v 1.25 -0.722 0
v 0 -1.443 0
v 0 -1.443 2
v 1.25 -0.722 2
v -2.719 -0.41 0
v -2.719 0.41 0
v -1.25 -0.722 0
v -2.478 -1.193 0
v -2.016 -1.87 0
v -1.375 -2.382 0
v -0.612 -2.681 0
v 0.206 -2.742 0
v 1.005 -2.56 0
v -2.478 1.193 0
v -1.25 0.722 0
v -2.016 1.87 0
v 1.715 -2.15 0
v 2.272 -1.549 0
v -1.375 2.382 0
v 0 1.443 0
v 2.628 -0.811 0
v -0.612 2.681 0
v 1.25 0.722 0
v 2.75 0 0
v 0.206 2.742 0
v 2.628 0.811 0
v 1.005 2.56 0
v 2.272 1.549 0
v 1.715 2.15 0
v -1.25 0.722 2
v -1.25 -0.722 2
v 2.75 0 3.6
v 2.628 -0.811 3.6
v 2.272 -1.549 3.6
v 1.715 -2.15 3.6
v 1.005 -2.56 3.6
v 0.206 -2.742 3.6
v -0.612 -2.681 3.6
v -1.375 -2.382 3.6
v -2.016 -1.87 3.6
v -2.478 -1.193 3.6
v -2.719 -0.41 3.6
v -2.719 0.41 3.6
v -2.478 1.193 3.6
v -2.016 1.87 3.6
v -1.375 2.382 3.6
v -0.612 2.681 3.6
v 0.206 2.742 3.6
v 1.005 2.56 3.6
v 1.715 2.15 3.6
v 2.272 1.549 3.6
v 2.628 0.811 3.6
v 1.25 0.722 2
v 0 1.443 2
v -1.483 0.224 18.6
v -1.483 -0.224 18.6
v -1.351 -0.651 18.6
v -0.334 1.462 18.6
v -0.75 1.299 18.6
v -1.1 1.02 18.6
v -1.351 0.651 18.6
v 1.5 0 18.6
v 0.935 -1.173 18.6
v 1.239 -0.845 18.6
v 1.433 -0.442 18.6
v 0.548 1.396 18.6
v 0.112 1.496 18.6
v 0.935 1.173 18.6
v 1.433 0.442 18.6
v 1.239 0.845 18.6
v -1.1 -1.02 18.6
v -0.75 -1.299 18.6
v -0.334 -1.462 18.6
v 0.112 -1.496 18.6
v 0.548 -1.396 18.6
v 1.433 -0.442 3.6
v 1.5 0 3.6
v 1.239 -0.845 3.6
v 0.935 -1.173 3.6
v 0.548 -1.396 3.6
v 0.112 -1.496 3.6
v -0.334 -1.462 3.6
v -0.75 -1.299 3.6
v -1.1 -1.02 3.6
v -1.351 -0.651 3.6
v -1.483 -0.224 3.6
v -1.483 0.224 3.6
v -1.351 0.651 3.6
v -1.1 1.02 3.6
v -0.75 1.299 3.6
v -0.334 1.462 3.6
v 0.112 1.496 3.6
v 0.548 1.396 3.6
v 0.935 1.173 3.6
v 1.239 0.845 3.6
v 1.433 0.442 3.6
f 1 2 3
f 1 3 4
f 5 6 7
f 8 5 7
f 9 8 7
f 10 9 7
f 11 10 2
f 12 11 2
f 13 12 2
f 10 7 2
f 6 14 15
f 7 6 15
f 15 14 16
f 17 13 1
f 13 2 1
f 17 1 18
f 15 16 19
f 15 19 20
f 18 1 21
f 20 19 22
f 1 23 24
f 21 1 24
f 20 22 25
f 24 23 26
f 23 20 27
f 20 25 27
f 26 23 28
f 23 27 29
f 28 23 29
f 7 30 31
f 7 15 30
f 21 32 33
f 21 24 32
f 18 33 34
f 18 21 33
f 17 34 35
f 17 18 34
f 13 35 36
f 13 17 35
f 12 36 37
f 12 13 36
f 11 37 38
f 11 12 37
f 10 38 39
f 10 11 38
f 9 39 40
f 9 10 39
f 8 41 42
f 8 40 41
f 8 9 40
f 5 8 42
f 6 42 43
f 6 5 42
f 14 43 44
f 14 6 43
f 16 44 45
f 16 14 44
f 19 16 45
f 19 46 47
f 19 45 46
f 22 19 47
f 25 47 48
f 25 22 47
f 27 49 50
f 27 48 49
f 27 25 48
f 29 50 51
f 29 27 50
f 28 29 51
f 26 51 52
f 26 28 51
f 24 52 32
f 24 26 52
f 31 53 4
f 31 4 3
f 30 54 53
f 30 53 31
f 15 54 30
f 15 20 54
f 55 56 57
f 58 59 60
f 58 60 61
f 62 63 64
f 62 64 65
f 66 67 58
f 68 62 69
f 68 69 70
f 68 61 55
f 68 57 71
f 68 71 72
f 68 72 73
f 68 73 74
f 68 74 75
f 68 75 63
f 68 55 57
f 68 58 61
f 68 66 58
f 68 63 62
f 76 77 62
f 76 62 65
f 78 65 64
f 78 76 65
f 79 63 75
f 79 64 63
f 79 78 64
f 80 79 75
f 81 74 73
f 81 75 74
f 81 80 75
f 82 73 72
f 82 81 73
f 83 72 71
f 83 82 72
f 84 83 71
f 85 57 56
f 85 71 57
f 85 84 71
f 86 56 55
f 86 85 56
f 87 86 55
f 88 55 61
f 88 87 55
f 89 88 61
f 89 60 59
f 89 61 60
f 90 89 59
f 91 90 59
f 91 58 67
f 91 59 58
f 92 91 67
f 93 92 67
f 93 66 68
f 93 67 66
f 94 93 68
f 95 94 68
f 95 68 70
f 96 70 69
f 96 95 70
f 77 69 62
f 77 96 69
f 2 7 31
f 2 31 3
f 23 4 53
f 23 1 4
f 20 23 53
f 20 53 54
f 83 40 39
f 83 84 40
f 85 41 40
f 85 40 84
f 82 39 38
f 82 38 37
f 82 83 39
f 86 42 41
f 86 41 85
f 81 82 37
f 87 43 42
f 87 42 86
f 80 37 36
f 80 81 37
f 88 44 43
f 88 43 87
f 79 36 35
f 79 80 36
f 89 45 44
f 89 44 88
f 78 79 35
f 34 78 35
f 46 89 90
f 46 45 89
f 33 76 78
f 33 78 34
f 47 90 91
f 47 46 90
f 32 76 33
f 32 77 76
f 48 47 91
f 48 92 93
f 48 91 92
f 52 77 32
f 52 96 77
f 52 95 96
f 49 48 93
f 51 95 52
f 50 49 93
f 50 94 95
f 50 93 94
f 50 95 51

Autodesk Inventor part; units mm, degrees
ref_plane "YZ Plane" through (0, 0, 0) normal (1, 0, 0) x (0, 1, 0)
ref_plane "XZ Plane" through (0, 0, 0) normal (0, 1, 0) x (-1, 0, 0)
ref_plane "XY Plane" through (0, 0, 0) normal (0, 0, 1) x (1, 0, 0)
sketch "スケッチ1" plane through (0, 0, 0) normal (0, 0, 1) x (1, 0, 0)
  circle A0 centre (0, 0) radius 2.75
  dimension "d0" = 5.5
extrude "押し出し1" add sketch "スケッチ1" along normal blind 3.6
sketch "スケッチ2" plane through (0, 0, 3.6) normal (0, 0, 1) x (1, 0, 0)
  circle A0 centre (0, 0) radius 1.5
  dimension "d3" = 3
extrude "押し出し2" add sketch "スケッチ2" along normal blind 15
thread "ねじ1" size "M3x0.5" class "6g" standard "ANSI Metric M Profile" full length
sketch "スケッチ3" plane through (0, 0, 0) normal (0, 0, -1) x (-1, 0, 0)
  line L0 (0, -1.4434) -> (-1.25, -0.7217)
  line L1 (-1.25, -0.7217) -> (-1.25, 0.7217)
  line L2 (-1.25, 0.7217) -> (0, 1.4434)
  line L3 (0, 1.4434) -> (1.25, 0.7217)
  line L4 (1.25, 0.7217) -> (1.25, -0.7217)
  line L5 (1.25, -0.7217) -> (0, -1.4434)
  point P0 (0, 0)
  point P1 (0, 0)
  dimension "d8" = 2.5
extrude "押し出し3" cut sketch "スケッチ3" against normal blind 2
properties part number "Bolt_M3_15_for_SetCollar_d6" material "ステンレス鋼"
